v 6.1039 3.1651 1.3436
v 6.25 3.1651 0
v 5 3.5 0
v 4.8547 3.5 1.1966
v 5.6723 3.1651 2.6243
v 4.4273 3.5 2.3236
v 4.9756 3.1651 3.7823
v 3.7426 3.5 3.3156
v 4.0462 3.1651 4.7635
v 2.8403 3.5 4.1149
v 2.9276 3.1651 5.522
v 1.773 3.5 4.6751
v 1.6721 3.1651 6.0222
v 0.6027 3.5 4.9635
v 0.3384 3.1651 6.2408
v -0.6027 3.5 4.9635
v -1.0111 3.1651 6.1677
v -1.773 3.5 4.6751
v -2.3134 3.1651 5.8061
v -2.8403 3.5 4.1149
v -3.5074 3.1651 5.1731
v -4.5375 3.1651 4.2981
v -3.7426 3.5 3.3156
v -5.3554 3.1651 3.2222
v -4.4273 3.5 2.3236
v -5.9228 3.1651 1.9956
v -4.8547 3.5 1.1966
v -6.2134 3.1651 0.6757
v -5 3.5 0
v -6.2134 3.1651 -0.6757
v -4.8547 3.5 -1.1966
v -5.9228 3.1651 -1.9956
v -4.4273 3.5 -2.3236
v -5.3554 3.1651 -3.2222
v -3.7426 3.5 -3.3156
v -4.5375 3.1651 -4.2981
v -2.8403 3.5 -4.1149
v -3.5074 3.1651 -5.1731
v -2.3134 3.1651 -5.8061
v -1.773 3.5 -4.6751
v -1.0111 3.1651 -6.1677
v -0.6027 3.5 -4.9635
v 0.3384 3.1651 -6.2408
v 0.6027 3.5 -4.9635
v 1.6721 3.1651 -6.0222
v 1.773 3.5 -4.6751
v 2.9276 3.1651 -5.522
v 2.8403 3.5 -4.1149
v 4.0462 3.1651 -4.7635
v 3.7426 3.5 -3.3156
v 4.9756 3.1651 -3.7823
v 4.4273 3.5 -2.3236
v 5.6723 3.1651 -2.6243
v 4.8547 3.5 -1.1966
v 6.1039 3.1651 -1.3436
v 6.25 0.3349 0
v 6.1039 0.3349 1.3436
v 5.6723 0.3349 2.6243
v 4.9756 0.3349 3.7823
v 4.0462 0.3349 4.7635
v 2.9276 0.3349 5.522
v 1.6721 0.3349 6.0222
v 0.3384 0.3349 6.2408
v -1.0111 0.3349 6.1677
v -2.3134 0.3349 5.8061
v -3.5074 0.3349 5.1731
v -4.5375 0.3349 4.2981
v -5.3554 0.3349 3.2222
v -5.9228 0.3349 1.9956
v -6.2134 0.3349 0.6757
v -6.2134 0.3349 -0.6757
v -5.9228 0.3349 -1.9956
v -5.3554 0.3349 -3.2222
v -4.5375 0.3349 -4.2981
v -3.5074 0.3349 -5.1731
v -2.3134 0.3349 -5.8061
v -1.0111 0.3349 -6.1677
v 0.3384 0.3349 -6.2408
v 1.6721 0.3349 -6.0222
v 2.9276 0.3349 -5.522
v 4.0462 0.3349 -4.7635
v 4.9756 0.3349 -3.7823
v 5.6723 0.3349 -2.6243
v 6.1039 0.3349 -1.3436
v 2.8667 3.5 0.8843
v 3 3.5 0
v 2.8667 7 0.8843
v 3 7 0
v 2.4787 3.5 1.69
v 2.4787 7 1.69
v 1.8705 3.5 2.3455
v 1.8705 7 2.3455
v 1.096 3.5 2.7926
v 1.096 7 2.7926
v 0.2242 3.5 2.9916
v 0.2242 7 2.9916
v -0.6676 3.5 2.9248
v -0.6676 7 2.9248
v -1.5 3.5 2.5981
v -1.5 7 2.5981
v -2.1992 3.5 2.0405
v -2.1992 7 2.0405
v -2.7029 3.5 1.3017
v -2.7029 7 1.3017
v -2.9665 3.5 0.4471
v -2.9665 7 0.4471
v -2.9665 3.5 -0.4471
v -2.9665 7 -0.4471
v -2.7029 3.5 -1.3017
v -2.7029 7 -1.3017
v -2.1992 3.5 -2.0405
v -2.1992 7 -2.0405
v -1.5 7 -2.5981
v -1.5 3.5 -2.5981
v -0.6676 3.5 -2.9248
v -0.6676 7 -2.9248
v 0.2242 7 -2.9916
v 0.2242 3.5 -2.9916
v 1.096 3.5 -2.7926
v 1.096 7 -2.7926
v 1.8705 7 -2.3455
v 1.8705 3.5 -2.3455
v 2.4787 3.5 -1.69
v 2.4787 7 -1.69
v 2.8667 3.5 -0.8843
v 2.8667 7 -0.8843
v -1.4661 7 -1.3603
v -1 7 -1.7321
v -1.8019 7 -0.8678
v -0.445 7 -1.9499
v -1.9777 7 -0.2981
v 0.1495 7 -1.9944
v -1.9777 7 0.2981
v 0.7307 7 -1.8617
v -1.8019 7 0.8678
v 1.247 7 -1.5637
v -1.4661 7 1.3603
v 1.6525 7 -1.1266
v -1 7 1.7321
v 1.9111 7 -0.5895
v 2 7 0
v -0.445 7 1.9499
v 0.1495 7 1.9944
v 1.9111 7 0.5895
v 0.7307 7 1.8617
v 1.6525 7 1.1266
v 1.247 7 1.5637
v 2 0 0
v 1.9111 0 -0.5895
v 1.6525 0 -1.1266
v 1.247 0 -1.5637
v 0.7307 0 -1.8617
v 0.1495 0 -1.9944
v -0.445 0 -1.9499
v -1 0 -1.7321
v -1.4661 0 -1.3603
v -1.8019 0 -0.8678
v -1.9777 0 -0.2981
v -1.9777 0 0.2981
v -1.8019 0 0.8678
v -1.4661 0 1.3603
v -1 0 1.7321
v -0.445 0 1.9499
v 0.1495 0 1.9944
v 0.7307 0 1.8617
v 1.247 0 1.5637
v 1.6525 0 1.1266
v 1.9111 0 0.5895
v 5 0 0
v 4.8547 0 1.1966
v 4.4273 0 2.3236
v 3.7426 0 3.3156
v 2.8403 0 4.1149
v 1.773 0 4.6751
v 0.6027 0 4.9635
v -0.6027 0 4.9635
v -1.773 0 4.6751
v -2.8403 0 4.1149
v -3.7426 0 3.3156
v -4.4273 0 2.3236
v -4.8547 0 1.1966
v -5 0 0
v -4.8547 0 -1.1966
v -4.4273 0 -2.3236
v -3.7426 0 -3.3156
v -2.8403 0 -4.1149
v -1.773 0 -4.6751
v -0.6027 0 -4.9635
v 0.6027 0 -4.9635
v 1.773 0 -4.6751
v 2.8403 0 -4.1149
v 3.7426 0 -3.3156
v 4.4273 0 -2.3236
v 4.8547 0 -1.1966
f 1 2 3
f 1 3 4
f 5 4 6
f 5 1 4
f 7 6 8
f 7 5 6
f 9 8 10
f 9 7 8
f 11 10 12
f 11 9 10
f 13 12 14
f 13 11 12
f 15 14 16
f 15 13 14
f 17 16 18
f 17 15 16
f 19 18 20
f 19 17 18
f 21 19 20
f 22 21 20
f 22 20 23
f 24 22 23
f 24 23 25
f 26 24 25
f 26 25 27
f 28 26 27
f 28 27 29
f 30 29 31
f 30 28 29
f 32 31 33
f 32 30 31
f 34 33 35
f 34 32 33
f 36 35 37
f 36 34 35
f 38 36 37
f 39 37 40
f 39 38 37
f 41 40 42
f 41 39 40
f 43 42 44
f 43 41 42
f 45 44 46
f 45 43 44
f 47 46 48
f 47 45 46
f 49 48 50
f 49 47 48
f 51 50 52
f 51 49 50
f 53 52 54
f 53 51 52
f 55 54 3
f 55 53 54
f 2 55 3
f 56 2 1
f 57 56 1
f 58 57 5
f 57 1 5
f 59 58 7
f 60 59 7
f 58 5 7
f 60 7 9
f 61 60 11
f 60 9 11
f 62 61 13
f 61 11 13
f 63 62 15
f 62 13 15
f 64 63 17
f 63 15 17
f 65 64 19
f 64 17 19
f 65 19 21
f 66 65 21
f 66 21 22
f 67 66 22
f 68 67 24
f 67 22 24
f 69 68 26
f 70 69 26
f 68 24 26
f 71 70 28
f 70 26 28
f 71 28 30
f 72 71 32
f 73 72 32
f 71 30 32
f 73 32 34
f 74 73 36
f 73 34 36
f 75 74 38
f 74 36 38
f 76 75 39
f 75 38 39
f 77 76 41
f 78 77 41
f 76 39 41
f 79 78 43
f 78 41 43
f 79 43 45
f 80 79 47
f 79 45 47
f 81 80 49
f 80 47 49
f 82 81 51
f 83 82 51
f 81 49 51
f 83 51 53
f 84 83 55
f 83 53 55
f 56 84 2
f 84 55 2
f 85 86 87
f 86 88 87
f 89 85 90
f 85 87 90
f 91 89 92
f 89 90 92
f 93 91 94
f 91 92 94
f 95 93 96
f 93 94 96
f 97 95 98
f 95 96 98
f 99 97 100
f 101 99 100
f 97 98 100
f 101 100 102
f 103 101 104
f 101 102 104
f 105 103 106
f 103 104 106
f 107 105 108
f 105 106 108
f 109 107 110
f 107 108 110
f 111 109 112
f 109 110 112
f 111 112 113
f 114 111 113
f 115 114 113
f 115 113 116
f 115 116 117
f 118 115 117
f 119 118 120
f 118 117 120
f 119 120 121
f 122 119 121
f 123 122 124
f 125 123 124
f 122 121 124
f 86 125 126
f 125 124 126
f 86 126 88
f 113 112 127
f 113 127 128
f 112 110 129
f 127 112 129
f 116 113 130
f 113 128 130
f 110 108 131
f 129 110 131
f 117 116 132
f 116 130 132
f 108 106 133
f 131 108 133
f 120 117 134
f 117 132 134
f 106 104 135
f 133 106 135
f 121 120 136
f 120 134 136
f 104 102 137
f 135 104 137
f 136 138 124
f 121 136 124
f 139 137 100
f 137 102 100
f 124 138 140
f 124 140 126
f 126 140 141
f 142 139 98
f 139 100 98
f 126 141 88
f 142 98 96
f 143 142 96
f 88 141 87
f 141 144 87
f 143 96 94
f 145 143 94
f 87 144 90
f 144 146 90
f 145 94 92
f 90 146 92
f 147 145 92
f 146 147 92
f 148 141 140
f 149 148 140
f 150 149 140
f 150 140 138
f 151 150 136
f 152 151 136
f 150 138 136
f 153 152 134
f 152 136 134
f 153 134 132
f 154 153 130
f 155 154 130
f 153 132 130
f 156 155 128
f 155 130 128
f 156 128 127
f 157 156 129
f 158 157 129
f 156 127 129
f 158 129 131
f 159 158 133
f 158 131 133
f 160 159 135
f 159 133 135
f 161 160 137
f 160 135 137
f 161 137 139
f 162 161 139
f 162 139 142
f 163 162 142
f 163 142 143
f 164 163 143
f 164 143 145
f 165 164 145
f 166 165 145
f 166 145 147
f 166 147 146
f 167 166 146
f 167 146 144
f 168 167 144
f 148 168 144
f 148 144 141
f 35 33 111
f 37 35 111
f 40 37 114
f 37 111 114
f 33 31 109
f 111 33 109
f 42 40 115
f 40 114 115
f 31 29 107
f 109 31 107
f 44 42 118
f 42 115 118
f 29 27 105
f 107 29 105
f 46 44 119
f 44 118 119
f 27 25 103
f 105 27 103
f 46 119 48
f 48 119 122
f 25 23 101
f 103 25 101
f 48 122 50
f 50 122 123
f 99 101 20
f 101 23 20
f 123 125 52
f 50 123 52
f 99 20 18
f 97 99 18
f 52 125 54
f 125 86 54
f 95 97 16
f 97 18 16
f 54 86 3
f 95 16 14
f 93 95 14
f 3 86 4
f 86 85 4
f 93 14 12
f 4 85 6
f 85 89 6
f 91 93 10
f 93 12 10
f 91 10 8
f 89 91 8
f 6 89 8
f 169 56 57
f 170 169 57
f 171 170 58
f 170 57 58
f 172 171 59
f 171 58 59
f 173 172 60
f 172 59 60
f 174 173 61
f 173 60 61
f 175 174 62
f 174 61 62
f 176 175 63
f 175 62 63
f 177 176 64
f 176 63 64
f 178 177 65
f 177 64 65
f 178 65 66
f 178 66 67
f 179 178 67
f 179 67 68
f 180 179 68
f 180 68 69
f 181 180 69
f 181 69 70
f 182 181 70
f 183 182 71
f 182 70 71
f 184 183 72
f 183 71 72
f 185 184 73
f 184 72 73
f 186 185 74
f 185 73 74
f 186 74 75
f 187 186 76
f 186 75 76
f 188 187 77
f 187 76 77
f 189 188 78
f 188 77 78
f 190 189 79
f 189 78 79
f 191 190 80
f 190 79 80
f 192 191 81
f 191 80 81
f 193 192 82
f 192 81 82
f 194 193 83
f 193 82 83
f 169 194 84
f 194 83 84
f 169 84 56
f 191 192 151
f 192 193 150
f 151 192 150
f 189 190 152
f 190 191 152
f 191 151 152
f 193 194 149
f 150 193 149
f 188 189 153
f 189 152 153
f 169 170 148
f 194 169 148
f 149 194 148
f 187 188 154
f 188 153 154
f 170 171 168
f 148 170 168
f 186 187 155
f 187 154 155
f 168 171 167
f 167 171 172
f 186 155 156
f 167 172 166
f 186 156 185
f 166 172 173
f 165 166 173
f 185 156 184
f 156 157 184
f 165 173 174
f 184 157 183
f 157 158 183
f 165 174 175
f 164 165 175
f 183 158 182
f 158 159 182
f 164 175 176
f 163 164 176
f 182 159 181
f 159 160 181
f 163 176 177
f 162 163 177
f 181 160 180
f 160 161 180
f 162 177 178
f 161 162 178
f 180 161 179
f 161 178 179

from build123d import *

# Parameters (mm, degrees)
CHAMFER_2_SIZE           = 1.25
CHAMFER_2_SIZE2          = 0.334936491
CHAMFER_3_SIZE           = 1.25
CHAMFER_3_SIZE2          = 0.334936491
SKETCH_4_R               = 2
CUT_EXTRUDE_2_DEPTH      = 1
CUT_EXTRUDE_2_DEPTH_BACK = 8


with BuildPart() as part:
    # Эскиз2 → Повернуть2 (revolve)
    with BuildSketch(Plane.XY):
        Polygon((0, 0), (6.25, 0), (6.25, 3.5), (3, 3.5), (3, 7), (0, 7), align=None)
    revolve(axis=Axis((0, 7, 0), (0, -1, 0)))

    # Фаска2
    chamfer_2_edges = [part.edges().sort_by_distance(p)[0] for p in [
        (-6.25, 3.5, 0),
    ]]
    chamfer_2_side = [part.faces().sort_by_distance(p)[0] for p in [
        (-6.073223305, 3.5, 0),
    ]]
    chamfer(chamfer_2_edges, length=CHAMFER_2_SIZE, length2=CHAMFER_2_SIZE2, reference=chamfer_2_side[0])

    # Фаска3
    chamfer_3_edges = [part.edges().sort_by_distance(p)[0] for p in [
        (-6.25, 0, 0),
    ]]
    chamfer_3_side = [part.faces().sort_by_distance(p)[0] for p in [
        (0, 0, 0),
    ]]
    chamfer(chamfer_3_edges, length=CHAMFER_3_SIZE, length2=CHAMFER_3_SIZE2, reference=chamfer_3_side[0])

    # Эскиз4 → Вырез-Вытянуть2 (cut, two sides)
    with BuildSketch(Plane(origin=(0, 7, 0), x_dir=(1, 0, 0), z_dir=(0, 1, 0))) as cut_extrude_2_sk:
        Circle(SKETCH_4_R)
    extrude(amount=CUT_EXTRUDE_2_DEPTH, mode=Mode.SUBTRACT)
    extrude(cut_extrude_2_sk.sketch, amount=-CUT_EXTRUDE_2_DEPTH_BACK, mode=Mode.SUBTRACT)


solid = part.part
